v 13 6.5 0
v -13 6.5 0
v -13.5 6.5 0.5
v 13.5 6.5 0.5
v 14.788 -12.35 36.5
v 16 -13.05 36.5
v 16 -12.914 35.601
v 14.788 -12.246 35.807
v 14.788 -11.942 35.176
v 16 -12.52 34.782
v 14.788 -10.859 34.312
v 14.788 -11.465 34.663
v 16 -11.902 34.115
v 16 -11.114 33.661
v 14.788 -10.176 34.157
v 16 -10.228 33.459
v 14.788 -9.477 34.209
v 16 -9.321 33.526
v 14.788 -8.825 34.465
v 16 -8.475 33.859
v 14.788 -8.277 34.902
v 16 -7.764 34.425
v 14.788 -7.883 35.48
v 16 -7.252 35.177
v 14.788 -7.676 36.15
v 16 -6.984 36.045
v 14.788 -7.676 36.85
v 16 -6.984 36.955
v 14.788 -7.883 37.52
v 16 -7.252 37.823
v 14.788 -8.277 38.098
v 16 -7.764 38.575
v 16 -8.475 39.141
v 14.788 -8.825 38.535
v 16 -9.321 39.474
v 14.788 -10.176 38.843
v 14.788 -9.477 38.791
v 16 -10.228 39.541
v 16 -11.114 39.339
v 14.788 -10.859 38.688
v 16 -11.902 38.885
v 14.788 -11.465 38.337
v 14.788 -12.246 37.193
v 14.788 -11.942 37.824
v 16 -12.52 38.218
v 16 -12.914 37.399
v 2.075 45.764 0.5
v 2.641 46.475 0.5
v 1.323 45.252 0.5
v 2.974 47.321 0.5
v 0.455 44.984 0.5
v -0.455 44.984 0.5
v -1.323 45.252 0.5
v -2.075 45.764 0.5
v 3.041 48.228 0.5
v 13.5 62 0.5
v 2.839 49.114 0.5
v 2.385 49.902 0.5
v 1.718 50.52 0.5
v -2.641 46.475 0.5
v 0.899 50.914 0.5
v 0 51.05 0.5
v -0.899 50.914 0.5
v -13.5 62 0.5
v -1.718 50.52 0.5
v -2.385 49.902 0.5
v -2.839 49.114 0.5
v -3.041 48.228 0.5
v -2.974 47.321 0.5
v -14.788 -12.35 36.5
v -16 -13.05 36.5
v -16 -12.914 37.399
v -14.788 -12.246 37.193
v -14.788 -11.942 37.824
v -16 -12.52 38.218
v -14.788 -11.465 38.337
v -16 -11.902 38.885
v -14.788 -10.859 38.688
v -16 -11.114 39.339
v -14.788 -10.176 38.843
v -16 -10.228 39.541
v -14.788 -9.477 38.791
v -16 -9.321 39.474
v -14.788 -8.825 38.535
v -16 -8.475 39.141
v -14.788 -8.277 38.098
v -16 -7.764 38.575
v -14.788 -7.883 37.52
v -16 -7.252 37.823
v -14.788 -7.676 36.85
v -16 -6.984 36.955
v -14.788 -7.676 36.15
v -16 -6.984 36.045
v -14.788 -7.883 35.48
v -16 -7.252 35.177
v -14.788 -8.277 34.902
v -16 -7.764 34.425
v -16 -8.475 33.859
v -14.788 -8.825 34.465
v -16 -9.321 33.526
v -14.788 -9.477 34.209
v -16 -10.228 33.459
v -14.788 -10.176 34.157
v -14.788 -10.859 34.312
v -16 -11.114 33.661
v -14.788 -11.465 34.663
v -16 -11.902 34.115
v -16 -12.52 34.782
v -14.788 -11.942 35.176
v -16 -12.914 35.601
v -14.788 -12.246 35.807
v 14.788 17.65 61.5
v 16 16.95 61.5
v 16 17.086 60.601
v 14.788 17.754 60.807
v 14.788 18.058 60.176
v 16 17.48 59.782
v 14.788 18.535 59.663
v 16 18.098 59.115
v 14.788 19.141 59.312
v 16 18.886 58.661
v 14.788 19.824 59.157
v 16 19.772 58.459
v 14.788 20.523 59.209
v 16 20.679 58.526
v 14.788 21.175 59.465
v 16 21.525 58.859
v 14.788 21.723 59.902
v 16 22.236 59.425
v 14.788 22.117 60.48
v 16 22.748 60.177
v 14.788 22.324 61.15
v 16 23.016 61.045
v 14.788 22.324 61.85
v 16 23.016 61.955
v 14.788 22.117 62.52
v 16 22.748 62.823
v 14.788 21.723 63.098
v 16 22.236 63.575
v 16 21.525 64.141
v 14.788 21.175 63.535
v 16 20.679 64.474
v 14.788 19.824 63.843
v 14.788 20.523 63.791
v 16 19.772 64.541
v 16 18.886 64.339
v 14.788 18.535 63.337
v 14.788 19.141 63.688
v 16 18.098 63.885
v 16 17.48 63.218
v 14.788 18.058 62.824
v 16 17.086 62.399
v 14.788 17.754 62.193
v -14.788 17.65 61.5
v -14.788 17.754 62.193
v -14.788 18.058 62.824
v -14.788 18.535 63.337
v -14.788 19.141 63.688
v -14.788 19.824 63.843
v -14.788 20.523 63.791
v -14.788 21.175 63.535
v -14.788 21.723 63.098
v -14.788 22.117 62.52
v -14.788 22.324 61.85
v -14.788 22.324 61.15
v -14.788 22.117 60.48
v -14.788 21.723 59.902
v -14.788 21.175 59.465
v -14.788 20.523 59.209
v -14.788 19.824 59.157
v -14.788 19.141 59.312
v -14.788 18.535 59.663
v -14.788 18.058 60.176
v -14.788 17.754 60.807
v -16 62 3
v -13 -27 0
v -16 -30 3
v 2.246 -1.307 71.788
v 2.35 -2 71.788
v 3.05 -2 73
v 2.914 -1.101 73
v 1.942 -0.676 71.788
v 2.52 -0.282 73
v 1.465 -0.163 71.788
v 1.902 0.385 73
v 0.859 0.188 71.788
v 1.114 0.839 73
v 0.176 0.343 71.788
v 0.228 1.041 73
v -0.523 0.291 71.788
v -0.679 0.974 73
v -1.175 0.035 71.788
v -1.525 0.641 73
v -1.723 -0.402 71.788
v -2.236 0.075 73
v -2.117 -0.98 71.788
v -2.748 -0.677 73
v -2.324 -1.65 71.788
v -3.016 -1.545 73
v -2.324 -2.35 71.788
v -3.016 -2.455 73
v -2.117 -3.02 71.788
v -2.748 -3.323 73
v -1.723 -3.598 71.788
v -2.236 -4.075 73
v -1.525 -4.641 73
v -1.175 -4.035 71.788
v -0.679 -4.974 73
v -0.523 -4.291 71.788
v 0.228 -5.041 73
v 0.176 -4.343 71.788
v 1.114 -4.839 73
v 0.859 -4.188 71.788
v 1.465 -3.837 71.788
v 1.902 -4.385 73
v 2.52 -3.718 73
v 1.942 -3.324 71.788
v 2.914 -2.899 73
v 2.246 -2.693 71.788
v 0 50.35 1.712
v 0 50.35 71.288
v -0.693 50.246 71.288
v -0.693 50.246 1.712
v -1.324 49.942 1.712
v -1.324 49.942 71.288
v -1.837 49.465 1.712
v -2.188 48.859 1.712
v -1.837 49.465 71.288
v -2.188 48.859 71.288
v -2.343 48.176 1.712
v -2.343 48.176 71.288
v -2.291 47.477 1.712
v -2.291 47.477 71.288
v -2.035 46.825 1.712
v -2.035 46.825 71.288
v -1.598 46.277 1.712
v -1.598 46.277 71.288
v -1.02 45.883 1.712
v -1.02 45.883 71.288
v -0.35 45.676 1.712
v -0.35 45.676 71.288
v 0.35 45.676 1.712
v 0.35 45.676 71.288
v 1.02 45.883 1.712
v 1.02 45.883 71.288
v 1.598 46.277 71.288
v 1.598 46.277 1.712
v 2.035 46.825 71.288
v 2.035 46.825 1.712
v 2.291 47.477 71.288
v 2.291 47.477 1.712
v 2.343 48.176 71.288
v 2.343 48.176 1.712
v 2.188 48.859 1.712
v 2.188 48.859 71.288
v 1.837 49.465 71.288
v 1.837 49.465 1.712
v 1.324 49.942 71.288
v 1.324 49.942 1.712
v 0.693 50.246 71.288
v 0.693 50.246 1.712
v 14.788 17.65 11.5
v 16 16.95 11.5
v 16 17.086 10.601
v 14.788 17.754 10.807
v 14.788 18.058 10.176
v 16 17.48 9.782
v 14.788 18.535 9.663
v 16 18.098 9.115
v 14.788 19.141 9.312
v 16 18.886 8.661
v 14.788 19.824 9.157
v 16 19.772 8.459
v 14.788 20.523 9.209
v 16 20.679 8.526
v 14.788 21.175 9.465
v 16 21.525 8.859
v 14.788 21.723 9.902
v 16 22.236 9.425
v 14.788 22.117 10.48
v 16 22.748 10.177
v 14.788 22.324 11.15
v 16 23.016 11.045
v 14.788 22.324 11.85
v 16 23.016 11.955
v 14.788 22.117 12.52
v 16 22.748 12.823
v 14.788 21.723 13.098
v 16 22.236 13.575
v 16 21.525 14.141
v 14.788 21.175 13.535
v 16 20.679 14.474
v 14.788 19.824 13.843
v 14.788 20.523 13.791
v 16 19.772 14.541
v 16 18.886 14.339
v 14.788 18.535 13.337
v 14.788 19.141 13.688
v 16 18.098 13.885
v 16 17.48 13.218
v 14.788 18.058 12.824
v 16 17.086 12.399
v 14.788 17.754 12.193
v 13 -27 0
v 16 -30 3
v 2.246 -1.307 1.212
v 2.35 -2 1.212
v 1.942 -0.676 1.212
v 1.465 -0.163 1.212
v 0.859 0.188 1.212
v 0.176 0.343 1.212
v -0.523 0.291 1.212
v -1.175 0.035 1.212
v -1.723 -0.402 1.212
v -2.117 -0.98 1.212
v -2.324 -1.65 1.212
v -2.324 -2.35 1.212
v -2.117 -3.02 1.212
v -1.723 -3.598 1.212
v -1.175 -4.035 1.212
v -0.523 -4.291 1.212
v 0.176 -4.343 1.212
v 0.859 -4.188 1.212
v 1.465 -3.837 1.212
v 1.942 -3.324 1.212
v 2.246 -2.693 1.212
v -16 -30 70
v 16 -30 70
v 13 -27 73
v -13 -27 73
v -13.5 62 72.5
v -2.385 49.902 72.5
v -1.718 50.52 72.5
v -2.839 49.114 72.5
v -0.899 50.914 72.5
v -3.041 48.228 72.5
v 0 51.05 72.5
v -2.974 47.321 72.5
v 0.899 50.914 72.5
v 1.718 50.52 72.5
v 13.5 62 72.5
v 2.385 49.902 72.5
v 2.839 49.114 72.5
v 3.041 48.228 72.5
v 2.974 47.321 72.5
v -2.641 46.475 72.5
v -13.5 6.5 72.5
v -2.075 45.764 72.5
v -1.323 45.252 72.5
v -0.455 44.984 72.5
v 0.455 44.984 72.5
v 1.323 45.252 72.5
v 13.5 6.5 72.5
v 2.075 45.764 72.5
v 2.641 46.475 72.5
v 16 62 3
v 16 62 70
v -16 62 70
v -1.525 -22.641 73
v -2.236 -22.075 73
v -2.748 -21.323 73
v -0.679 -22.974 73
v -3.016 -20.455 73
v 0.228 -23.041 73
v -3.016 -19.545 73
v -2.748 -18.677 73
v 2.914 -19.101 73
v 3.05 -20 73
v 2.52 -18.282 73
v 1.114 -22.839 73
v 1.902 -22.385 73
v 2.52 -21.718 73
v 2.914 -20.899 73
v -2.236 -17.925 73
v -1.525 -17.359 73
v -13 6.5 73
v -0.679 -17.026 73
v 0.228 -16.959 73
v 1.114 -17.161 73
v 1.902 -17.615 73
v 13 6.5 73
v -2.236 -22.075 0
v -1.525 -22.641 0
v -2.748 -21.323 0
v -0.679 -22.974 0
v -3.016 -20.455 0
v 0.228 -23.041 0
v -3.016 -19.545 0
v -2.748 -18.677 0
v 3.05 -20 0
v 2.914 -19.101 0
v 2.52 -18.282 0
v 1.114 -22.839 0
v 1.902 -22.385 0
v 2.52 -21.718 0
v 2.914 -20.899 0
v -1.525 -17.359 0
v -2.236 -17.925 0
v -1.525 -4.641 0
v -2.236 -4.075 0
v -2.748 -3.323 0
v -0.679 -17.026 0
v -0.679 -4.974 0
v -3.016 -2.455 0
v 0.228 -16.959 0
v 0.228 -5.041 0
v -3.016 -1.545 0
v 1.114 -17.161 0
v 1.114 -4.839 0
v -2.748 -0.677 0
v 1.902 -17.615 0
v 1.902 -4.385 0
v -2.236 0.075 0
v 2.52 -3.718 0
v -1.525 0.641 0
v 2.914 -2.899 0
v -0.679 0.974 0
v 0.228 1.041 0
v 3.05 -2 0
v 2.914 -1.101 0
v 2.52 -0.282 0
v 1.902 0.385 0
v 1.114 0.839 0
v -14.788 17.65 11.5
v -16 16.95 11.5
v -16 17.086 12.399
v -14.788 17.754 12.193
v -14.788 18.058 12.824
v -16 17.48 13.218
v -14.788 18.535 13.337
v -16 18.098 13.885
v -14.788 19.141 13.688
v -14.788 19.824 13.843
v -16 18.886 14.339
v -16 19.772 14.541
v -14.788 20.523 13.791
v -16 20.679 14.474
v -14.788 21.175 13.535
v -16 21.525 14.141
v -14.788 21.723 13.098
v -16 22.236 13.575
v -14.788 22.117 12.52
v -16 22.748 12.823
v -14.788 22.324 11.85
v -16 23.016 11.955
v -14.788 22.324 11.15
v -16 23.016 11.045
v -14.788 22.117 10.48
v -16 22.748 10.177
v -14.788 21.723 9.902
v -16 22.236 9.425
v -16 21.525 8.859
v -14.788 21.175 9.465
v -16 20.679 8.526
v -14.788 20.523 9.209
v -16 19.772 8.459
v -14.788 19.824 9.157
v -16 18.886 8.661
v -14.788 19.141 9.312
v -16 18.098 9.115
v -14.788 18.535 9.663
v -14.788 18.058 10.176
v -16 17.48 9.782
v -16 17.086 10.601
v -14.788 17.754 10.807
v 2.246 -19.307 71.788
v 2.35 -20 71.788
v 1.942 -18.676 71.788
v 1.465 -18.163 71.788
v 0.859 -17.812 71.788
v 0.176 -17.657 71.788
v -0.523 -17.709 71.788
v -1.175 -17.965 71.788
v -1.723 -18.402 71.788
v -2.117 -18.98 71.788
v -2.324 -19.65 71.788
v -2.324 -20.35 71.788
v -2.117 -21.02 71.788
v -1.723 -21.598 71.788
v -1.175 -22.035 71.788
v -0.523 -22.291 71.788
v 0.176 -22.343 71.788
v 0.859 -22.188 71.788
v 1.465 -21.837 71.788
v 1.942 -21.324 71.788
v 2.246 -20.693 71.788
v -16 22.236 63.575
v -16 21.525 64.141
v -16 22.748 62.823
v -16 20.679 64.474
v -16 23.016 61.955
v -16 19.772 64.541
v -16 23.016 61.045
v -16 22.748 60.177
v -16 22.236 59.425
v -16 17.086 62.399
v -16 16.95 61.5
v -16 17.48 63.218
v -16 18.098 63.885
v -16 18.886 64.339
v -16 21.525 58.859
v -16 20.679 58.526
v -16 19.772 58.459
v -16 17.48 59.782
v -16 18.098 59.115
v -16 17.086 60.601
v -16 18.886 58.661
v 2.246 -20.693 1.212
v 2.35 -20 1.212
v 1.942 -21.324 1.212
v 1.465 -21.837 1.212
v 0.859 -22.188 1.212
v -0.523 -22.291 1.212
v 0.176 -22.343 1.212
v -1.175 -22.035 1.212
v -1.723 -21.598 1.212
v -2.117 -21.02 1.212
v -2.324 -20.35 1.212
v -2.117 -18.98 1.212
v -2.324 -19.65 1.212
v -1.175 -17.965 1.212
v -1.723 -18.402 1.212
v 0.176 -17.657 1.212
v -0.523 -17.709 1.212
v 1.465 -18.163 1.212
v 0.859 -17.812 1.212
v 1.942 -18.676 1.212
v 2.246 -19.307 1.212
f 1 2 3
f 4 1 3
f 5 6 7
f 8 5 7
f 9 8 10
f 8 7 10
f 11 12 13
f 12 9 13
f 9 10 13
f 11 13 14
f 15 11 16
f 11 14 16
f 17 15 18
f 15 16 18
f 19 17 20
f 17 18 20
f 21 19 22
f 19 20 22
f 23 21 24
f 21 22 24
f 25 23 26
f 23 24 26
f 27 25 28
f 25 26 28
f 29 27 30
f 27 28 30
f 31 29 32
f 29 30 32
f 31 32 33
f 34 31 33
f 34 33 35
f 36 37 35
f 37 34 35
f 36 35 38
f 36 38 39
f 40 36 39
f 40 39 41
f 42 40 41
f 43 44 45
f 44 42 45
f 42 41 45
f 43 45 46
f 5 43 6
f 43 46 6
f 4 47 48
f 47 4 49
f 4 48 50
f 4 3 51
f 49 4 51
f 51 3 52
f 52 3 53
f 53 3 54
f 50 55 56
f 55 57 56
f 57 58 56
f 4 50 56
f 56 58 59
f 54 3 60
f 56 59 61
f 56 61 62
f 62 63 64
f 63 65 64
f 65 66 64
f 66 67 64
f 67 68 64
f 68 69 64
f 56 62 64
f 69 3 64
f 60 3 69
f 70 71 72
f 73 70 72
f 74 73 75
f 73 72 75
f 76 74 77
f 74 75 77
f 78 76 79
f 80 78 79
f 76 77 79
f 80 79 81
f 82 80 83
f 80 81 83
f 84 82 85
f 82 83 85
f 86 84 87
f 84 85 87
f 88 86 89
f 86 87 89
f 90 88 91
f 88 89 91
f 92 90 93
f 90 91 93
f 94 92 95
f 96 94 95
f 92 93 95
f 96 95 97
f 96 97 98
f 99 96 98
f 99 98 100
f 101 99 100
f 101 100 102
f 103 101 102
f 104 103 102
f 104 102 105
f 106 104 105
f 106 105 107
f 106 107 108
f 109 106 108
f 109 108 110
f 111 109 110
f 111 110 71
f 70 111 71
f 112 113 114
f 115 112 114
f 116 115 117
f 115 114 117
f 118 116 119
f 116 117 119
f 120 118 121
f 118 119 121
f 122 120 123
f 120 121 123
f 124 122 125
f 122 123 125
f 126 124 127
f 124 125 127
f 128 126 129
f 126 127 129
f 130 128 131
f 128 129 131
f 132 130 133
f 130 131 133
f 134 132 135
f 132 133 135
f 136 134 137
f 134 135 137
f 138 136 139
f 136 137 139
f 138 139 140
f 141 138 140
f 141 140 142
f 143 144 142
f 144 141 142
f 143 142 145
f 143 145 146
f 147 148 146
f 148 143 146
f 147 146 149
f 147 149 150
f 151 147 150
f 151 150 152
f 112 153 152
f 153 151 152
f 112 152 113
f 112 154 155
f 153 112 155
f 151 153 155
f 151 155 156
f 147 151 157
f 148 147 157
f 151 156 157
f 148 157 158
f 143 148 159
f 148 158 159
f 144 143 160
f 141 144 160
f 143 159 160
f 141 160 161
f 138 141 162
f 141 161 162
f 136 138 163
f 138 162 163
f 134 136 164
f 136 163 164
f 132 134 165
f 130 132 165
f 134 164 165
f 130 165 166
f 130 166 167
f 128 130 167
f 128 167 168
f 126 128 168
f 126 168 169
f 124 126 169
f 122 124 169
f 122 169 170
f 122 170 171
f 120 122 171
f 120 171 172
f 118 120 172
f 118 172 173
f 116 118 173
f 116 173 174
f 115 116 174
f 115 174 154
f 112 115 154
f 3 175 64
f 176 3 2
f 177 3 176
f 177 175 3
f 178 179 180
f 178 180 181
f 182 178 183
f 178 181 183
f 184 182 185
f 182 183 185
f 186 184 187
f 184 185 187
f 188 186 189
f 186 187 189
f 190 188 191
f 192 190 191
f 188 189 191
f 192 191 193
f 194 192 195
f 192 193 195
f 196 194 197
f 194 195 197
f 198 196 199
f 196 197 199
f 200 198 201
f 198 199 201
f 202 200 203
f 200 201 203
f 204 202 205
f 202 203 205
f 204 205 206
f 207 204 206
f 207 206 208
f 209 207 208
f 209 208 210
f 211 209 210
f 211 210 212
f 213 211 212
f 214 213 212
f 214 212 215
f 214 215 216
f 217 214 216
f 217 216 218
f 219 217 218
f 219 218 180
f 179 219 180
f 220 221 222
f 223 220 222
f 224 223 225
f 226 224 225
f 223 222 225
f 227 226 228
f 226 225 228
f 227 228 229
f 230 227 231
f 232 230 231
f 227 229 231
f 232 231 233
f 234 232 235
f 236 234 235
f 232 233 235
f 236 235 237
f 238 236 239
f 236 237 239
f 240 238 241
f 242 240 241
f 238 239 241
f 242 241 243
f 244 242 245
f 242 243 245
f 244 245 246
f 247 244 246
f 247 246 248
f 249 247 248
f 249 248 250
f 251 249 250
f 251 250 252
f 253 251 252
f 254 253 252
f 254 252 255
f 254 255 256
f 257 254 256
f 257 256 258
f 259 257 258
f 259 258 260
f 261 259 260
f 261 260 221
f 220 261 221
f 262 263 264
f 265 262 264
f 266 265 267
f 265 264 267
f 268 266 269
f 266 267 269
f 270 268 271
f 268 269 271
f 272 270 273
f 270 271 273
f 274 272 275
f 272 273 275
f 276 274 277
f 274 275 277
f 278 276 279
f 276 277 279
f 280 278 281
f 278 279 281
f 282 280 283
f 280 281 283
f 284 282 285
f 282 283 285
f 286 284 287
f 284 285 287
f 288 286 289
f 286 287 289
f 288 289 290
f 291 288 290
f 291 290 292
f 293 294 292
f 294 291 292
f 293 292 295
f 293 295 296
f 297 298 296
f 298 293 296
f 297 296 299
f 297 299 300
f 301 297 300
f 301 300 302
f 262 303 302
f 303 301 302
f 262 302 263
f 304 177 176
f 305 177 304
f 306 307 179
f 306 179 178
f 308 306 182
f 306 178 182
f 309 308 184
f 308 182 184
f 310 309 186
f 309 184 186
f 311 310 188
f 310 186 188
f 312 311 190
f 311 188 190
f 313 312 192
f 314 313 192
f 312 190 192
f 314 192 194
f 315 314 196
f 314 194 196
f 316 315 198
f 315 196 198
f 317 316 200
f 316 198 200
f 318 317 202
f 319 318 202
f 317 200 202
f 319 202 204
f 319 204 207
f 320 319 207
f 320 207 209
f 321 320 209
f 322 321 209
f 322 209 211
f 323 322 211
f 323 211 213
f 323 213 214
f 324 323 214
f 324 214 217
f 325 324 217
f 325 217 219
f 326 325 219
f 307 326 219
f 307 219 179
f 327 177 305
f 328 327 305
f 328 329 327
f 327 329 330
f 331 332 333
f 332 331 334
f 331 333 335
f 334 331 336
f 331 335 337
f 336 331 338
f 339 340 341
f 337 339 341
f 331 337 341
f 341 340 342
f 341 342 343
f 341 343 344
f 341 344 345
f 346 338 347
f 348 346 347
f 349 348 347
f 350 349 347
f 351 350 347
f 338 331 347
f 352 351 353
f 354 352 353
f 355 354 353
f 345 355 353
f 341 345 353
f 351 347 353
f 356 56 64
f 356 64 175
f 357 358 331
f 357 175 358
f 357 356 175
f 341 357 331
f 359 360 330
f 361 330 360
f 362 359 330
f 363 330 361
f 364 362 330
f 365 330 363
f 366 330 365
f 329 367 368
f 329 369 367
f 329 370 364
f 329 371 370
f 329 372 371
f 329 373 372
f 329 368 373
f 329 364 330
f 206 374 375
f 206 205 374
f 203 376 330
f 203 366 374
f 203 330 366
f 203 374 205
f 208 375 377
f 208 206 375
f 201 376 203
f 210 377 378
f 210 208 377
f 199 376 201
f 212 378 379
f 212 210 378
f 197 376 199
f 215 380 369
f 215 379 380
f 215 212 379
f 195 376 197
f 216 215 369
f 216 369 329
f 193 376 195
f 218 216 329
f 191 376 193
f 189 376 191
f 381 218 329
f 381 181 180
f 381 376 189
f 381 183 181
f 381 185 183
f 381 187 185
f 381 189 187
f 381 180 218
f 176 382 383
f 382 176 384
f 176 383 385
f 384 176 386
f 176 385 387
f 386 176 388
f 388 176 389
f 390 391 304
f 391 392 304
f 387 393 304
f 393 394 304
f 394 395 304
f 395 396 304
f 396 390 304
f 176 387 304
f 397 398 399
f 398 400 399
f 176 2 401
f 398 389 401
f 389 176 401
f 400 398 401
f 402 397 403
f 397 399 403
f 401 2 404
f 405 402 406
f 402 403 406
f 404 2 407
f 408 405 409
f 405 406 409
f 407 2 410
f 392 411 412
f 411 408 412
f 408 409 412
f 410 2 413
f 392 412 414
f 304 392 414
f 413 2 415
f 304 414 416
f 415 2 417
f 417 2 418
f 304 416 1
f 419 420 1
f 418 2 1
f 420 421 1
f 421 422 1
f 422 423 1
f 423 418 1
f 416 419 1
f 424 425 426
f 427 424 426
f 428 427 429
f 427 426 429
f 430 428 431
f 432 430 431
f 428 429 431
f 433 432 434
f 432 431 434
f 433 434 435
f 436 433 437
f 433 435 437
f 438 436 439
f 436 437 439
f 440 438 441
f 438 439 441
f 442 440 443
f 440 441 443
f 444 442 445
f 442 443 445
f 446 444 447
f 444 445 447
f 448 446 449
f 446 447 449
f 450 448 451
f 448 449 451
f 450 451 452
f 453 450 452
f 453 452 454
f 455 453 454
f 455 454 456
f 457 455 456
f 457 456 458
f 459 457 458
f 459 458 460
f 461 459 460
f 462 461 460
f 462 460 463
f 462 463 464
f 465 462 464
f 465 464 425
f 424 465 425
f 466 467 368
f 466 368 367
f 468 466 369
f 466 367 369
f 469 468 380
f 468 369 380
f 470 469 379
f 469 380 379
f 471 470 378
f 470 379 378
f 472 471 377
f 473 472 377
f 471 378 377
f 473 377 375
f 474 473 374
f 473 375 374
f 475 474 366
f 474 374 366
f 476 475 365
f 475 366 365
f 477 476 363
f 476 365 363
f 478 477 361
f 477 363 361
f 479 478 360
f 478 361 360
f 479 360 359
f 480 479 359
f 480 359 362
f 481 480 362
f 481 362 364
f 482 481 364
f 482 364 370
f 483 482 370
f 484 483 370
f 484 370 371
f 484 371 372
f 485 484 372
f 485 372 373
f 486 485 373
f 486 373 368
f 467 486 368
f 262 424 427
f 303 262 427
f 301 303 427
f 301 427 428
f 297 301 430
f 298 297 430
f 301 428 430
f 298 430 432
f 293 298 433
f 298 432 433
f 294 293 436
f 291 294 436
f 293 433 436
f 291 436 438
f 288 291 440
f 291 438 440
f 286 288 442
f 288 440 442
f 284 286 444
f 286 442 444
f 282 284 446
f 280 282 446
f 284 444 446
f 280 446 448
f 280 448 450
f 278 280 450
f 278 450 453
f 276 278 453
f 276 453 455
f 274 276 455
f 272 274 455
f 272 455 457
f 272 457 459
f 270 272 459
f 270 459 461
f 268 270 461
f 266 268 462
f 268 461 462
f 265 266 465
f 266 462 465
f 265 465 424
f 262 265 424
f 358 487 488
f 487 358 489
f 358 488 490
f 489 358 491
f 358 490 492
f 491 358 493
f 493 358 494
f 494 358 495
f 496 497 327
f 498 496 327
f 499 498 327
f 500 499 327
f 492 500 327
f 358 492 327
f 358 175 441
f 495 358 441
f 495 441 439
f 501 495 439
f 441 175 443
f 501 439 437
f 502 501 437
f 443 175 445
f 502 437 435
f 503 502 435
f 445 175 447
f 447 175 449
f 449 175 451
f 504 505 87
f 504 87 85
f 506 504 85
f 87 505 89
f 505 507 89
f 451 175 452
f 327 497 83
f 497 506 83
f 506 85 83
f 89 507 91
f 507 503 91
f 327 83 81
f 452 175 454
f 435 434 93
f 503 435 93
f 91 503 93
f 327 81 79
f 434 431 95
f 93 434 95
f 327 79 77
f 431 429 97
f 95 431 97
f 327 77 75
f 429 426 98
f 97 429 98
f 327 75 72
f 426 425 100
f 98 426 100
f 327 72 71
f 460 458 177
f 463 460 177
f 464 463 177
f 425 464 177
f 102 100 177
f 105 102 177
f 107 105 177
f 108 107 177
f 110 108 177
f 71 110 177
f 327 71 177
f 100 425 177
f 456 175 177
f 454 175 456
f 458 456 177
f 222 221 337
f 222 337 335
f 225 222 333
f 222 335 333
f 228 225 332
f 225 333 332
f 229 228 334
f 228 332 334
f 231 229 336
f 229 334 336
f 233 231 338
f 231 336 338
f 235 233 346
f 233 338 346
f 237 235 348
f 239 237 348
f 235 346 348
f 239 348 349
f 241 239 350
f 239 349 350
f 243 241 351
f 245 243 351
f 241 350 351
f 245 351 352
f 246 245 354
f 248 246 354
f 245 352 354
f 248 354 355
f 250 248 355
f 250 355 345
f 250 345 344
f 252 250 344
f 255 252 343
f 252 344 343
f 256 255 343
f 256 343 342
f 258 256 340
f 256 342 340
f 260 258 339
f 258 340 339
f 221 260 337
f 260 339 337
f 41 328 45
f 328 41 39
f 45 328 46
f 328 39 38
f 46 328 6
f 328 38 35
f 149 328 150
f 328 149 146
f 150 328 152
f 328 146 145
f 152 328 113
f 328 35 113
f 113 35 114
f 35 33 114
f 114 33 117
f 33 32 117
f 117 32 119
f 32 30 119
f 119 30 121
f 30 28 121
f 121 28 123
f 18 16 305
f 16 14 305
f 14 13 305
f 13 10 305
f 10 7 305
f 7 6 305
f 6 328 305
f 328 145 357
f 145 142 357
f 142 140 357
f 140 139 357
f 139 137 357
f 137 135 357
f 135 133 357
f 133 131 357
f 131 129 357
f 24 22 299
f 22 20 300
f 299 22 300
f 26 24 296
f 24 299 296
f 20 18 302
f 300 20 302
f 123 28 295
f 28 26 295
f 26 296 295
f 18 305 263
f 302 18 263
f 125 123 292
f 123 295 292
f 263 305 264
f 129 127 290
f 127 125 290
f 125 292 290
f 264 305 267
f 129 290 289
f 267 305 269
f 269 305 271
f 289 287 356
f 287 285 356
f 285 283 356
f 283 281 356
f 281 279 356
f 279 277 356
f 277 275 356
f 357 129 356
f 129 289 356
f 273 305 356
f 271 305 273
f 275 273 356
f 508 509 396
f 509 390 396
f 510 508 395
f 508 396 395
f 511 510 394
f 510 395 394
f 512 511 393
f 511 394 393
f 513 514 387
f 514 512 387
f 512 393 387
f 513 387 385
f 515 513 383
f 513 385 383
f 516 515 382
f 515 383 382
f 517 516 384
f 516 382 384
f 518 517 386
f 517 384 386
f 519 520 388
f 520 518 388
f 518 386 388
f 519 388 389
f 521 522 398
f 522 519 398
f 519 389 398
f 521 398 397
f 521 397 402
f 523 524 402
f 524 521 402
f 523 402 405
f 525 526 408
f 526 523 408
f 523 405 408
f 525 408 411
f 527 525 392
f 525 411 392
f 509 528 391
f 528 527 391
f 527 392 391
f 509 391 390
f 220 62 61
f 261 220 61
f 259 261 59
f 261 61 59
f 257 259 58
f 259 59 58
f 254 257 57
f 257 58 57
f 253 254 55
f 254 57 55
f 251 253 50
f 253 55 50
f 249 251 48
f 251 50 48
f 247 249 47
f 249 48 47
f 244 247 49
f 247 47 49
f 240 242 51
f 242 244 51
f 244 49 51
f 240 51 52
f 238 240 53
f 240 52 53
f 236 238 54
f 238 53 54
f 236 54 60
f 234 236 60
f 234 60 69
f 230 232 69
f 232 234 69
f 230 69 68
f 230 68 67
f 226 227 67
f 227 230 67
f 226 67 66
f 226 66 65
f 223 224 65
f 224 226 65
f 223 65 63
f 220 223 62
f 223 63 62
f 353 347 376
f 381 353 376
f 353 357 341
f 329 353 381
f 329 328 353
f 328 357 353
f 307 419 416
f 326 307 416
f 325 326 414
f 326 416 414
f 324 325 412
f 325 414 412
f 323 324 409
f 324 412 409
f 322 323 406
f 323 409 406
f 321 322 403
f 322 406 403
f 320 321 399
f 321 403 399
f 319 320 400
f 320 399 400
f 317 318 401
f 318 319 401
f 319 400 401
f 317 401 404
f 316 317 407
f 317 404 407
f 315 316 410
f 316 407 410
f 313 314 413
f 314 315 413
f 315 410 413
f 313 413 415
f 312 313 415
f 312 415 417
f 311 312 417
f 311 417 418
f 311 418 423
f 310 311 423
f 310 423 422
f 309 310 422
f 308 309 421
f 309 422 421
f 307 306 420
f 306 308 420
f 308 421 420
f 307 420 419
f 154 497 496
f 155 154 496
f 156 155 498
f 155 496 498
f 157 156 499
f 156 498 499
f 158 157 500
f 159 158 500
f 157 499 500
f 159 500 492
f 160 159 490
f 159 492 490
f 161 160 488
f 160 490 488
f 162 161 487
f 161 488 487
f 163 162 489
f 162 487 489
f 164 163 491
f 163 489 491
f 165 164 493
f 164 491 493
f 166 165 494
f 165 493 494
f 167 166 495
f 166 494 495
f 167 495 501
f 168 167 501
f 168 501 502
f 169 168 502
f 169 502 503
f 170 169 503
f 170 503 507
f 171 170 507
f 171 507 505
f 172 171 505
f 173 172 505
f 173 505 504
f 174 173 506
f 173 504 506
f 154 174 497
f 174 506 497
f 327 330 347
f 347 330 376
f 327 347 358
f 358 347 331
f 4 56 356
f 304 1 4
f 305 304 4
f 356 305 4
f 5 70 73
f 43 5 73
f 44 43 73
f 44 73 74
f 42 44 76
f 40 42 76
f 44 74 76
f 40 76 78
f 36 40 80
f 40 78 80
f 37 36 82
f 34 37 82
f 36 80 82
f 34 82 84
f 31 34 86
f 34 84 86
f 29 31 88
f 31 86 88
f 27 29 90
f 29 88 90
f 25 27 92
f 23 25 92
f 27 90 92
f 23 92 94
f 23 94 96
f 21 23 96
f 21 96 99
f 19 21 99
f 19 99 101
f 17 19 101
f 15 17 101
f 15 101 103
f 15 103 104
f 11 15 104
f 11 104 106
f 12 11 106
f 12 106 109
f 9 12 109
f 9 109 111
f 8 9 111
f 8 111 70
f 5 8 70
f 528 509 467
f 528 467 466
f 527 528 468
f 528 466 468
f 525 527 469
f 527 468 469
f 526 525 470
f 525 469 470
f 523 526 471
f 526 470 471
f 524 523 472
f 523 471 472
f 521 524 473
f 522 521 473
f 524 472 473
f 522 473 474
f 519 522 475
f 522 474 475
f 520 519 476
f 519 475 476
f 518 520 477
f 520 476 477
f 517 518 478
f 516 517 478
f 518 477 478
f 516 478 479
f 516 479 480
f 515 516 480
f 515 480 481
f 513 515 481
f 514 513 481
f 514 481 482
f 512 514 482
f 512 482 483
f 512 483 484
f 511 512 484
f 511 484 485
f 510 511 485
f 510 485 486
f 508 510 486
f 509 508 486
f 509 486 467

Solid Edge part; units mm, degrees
sketch "Sketch1" plane through (0, 0, 0) normal (0, 0, 1) x (1, 0, 0)
  line L0 (-16, -30) -> (16, -30)
  line L1 (16, -30) -> (16, 30)
  line L2 (16, 30) -> (-16, 30)
  line L3 (-16, 30) -> (-16, -30)
  dimension "D1" = 32
  dimension "D2" = 60
extrude "Protrusion1" add sketch "Sketch1" along normal blind 73
sketch "Sketch2" plane through (0, 0, 73) normal (0, 0, 1) x (1, 0, 0)
  circle A0 centre (0, -20) radius 2.35
  circle A1 centre (0, -2) radius 2.35
  dimension "D1" = 4.7
  dimension "D2" = 18
  dimension "D3" = 10
extrude "Cutout1" cut sketch "Sketch2" against normal through all
chamfer "Fase_3" distance 0.7 angle 60 4 edges at (-2.35, -2, 73) (-2.35, -20, 73) (-2.35, -20, 0) (-2.35, -2, 0) measured on face at (-10.9867, -19.4, 73) measured on face at (-10.9867, -19.4, 0)
chamfer "Fase_6" distance 3 angle 45 4 edges at (-16, 0, 73) (-16, 0, 0) (16, 0, 73) (16, 0, 0)
chamfer "Fase_7" distance 3 angle 45 2 edges at (0, -30, 73) (0, -30, 0)
sketch "Sketch3" plane through (-16, 0, 36.5) normal (-1, 0, 0) x (0, -1, 0)
  circle A0 centre (-20, 25) radius 2.35
  circle A1 centre (-20, -25) radius 2.35
  circle A2 centre (10, 0) radius 2.35
  dimension "D1" = 4.7
  dimension "D2" = 50
  dimension "D3" = 10
  dimension "D4" = 30
extrude "Cutout2" cut sketch "Sketch3" against normal through all
chamfer "Fase_9" distance 0.7 angle 60 6 edges at (-16, 22.35, 61.5) (-16, -7.65, 36.5) (-16, 22.35, 11.5) (16, 20, 59.15) (16, 20, 9.15) (16, -10, 34.15) measured on face at (-16, 20.6, 58.1633) measured on face at (16, -20.6, 58.1633)
sketch "Sketch4" plane through (-16, 0, 36.5) normal (-1, 0, 0) x (0, -1, 0)
  line L0 (-6.5, 36.5) -> (-30, 36.5)
  line L1 (-30, 36.5) -> (-30, 36)
  line L2 (-30, 36) -> (-6.5, 36)
  line L3 (-6.5, 36) -> (-6.5, 36.5)
  line L4 (-30, -36.5) -> (-6.5, -36.5)
  line L5 (-6.5, -36.5) -> (-6.5, -36)
  line L6 (-6.5, -36) -> (-30, -36)
  line L7 (-30, -36) -> (-30, -36.5)
  dimension "D1" = 0.5
  dimension "D2" = 36.5
  dimension "D3" = 0.5
  dimension "D4" = 36.5
extrude "Cutout3" cut sketch "Sketch4" against normal through all
sketch "Sketch5" plane through (0, 30, 36.5) normal (0, 1, 0) x (1, 0, 0)
  line L0 (-16, 33.5) -> (-13.5, 36)
  line L1 (-13.5, 36) -> (13.5, 36)
  line L2 (13.5, 36) -> (16, 33.5)
  line L3 (16, 33.5) -> (16, -33.5)
  line L4 (16, -33.5) -> (13.5, -36)
  line L5 (13.5, -36) -> (-13.5, -36)
  line L6 (-13.5, -36) -> (-16, -33.5)
  line L7 (-16, -33.5) -> (-16, 33.5)
extrude "Protrusion2" add sketch "Sketch5" along normal blind 26
sketch "Sketch6" plane through (0, 36.25, 72.5) normal (0, 0, 1) x (0, 1, 0)
  circle A0 centre (11.75, 0) radius 2.35
  dimension "D1" = 8
extrude "Cutout4" cut sketch "Sketch6" against normal through all
chamfer "Fase_10" distance 0.7 angle 60 2 edges at (0, 45.65, 72.5) (-2.35, 48, 0.5) measured on face at (8.73, 48.245, 72.5) measured on face at (8.73, 14.255, 0.5)
sketch "Sketch7" plane through (0, 56, 36.5) normal (0, 1, 0) x (-1, 0, 0)
  line L0 (-13.5, 36) -> (-16, 33.5)
  line L1 (-16, 33.5) -> (-16, -33.5)
  line L2 (-16, -33.5) -> (-13.5, -36)
  line L3 (-13.5, -36) -> (13.5, -36)
  line L4 (13.5, -36) -> (16, -33.5)
  line L5 (16, -33.5) -> (16, 33.5)
  line L6 (16, 33.5) -> (13.5, 36)
  line L7 (13.5, 36) -> (-13.5, 36)
extrude "Extrusionsausprägung_3" add sketch "Sketch7" along normal blind 6
properties material "Nylon, allgemein"
